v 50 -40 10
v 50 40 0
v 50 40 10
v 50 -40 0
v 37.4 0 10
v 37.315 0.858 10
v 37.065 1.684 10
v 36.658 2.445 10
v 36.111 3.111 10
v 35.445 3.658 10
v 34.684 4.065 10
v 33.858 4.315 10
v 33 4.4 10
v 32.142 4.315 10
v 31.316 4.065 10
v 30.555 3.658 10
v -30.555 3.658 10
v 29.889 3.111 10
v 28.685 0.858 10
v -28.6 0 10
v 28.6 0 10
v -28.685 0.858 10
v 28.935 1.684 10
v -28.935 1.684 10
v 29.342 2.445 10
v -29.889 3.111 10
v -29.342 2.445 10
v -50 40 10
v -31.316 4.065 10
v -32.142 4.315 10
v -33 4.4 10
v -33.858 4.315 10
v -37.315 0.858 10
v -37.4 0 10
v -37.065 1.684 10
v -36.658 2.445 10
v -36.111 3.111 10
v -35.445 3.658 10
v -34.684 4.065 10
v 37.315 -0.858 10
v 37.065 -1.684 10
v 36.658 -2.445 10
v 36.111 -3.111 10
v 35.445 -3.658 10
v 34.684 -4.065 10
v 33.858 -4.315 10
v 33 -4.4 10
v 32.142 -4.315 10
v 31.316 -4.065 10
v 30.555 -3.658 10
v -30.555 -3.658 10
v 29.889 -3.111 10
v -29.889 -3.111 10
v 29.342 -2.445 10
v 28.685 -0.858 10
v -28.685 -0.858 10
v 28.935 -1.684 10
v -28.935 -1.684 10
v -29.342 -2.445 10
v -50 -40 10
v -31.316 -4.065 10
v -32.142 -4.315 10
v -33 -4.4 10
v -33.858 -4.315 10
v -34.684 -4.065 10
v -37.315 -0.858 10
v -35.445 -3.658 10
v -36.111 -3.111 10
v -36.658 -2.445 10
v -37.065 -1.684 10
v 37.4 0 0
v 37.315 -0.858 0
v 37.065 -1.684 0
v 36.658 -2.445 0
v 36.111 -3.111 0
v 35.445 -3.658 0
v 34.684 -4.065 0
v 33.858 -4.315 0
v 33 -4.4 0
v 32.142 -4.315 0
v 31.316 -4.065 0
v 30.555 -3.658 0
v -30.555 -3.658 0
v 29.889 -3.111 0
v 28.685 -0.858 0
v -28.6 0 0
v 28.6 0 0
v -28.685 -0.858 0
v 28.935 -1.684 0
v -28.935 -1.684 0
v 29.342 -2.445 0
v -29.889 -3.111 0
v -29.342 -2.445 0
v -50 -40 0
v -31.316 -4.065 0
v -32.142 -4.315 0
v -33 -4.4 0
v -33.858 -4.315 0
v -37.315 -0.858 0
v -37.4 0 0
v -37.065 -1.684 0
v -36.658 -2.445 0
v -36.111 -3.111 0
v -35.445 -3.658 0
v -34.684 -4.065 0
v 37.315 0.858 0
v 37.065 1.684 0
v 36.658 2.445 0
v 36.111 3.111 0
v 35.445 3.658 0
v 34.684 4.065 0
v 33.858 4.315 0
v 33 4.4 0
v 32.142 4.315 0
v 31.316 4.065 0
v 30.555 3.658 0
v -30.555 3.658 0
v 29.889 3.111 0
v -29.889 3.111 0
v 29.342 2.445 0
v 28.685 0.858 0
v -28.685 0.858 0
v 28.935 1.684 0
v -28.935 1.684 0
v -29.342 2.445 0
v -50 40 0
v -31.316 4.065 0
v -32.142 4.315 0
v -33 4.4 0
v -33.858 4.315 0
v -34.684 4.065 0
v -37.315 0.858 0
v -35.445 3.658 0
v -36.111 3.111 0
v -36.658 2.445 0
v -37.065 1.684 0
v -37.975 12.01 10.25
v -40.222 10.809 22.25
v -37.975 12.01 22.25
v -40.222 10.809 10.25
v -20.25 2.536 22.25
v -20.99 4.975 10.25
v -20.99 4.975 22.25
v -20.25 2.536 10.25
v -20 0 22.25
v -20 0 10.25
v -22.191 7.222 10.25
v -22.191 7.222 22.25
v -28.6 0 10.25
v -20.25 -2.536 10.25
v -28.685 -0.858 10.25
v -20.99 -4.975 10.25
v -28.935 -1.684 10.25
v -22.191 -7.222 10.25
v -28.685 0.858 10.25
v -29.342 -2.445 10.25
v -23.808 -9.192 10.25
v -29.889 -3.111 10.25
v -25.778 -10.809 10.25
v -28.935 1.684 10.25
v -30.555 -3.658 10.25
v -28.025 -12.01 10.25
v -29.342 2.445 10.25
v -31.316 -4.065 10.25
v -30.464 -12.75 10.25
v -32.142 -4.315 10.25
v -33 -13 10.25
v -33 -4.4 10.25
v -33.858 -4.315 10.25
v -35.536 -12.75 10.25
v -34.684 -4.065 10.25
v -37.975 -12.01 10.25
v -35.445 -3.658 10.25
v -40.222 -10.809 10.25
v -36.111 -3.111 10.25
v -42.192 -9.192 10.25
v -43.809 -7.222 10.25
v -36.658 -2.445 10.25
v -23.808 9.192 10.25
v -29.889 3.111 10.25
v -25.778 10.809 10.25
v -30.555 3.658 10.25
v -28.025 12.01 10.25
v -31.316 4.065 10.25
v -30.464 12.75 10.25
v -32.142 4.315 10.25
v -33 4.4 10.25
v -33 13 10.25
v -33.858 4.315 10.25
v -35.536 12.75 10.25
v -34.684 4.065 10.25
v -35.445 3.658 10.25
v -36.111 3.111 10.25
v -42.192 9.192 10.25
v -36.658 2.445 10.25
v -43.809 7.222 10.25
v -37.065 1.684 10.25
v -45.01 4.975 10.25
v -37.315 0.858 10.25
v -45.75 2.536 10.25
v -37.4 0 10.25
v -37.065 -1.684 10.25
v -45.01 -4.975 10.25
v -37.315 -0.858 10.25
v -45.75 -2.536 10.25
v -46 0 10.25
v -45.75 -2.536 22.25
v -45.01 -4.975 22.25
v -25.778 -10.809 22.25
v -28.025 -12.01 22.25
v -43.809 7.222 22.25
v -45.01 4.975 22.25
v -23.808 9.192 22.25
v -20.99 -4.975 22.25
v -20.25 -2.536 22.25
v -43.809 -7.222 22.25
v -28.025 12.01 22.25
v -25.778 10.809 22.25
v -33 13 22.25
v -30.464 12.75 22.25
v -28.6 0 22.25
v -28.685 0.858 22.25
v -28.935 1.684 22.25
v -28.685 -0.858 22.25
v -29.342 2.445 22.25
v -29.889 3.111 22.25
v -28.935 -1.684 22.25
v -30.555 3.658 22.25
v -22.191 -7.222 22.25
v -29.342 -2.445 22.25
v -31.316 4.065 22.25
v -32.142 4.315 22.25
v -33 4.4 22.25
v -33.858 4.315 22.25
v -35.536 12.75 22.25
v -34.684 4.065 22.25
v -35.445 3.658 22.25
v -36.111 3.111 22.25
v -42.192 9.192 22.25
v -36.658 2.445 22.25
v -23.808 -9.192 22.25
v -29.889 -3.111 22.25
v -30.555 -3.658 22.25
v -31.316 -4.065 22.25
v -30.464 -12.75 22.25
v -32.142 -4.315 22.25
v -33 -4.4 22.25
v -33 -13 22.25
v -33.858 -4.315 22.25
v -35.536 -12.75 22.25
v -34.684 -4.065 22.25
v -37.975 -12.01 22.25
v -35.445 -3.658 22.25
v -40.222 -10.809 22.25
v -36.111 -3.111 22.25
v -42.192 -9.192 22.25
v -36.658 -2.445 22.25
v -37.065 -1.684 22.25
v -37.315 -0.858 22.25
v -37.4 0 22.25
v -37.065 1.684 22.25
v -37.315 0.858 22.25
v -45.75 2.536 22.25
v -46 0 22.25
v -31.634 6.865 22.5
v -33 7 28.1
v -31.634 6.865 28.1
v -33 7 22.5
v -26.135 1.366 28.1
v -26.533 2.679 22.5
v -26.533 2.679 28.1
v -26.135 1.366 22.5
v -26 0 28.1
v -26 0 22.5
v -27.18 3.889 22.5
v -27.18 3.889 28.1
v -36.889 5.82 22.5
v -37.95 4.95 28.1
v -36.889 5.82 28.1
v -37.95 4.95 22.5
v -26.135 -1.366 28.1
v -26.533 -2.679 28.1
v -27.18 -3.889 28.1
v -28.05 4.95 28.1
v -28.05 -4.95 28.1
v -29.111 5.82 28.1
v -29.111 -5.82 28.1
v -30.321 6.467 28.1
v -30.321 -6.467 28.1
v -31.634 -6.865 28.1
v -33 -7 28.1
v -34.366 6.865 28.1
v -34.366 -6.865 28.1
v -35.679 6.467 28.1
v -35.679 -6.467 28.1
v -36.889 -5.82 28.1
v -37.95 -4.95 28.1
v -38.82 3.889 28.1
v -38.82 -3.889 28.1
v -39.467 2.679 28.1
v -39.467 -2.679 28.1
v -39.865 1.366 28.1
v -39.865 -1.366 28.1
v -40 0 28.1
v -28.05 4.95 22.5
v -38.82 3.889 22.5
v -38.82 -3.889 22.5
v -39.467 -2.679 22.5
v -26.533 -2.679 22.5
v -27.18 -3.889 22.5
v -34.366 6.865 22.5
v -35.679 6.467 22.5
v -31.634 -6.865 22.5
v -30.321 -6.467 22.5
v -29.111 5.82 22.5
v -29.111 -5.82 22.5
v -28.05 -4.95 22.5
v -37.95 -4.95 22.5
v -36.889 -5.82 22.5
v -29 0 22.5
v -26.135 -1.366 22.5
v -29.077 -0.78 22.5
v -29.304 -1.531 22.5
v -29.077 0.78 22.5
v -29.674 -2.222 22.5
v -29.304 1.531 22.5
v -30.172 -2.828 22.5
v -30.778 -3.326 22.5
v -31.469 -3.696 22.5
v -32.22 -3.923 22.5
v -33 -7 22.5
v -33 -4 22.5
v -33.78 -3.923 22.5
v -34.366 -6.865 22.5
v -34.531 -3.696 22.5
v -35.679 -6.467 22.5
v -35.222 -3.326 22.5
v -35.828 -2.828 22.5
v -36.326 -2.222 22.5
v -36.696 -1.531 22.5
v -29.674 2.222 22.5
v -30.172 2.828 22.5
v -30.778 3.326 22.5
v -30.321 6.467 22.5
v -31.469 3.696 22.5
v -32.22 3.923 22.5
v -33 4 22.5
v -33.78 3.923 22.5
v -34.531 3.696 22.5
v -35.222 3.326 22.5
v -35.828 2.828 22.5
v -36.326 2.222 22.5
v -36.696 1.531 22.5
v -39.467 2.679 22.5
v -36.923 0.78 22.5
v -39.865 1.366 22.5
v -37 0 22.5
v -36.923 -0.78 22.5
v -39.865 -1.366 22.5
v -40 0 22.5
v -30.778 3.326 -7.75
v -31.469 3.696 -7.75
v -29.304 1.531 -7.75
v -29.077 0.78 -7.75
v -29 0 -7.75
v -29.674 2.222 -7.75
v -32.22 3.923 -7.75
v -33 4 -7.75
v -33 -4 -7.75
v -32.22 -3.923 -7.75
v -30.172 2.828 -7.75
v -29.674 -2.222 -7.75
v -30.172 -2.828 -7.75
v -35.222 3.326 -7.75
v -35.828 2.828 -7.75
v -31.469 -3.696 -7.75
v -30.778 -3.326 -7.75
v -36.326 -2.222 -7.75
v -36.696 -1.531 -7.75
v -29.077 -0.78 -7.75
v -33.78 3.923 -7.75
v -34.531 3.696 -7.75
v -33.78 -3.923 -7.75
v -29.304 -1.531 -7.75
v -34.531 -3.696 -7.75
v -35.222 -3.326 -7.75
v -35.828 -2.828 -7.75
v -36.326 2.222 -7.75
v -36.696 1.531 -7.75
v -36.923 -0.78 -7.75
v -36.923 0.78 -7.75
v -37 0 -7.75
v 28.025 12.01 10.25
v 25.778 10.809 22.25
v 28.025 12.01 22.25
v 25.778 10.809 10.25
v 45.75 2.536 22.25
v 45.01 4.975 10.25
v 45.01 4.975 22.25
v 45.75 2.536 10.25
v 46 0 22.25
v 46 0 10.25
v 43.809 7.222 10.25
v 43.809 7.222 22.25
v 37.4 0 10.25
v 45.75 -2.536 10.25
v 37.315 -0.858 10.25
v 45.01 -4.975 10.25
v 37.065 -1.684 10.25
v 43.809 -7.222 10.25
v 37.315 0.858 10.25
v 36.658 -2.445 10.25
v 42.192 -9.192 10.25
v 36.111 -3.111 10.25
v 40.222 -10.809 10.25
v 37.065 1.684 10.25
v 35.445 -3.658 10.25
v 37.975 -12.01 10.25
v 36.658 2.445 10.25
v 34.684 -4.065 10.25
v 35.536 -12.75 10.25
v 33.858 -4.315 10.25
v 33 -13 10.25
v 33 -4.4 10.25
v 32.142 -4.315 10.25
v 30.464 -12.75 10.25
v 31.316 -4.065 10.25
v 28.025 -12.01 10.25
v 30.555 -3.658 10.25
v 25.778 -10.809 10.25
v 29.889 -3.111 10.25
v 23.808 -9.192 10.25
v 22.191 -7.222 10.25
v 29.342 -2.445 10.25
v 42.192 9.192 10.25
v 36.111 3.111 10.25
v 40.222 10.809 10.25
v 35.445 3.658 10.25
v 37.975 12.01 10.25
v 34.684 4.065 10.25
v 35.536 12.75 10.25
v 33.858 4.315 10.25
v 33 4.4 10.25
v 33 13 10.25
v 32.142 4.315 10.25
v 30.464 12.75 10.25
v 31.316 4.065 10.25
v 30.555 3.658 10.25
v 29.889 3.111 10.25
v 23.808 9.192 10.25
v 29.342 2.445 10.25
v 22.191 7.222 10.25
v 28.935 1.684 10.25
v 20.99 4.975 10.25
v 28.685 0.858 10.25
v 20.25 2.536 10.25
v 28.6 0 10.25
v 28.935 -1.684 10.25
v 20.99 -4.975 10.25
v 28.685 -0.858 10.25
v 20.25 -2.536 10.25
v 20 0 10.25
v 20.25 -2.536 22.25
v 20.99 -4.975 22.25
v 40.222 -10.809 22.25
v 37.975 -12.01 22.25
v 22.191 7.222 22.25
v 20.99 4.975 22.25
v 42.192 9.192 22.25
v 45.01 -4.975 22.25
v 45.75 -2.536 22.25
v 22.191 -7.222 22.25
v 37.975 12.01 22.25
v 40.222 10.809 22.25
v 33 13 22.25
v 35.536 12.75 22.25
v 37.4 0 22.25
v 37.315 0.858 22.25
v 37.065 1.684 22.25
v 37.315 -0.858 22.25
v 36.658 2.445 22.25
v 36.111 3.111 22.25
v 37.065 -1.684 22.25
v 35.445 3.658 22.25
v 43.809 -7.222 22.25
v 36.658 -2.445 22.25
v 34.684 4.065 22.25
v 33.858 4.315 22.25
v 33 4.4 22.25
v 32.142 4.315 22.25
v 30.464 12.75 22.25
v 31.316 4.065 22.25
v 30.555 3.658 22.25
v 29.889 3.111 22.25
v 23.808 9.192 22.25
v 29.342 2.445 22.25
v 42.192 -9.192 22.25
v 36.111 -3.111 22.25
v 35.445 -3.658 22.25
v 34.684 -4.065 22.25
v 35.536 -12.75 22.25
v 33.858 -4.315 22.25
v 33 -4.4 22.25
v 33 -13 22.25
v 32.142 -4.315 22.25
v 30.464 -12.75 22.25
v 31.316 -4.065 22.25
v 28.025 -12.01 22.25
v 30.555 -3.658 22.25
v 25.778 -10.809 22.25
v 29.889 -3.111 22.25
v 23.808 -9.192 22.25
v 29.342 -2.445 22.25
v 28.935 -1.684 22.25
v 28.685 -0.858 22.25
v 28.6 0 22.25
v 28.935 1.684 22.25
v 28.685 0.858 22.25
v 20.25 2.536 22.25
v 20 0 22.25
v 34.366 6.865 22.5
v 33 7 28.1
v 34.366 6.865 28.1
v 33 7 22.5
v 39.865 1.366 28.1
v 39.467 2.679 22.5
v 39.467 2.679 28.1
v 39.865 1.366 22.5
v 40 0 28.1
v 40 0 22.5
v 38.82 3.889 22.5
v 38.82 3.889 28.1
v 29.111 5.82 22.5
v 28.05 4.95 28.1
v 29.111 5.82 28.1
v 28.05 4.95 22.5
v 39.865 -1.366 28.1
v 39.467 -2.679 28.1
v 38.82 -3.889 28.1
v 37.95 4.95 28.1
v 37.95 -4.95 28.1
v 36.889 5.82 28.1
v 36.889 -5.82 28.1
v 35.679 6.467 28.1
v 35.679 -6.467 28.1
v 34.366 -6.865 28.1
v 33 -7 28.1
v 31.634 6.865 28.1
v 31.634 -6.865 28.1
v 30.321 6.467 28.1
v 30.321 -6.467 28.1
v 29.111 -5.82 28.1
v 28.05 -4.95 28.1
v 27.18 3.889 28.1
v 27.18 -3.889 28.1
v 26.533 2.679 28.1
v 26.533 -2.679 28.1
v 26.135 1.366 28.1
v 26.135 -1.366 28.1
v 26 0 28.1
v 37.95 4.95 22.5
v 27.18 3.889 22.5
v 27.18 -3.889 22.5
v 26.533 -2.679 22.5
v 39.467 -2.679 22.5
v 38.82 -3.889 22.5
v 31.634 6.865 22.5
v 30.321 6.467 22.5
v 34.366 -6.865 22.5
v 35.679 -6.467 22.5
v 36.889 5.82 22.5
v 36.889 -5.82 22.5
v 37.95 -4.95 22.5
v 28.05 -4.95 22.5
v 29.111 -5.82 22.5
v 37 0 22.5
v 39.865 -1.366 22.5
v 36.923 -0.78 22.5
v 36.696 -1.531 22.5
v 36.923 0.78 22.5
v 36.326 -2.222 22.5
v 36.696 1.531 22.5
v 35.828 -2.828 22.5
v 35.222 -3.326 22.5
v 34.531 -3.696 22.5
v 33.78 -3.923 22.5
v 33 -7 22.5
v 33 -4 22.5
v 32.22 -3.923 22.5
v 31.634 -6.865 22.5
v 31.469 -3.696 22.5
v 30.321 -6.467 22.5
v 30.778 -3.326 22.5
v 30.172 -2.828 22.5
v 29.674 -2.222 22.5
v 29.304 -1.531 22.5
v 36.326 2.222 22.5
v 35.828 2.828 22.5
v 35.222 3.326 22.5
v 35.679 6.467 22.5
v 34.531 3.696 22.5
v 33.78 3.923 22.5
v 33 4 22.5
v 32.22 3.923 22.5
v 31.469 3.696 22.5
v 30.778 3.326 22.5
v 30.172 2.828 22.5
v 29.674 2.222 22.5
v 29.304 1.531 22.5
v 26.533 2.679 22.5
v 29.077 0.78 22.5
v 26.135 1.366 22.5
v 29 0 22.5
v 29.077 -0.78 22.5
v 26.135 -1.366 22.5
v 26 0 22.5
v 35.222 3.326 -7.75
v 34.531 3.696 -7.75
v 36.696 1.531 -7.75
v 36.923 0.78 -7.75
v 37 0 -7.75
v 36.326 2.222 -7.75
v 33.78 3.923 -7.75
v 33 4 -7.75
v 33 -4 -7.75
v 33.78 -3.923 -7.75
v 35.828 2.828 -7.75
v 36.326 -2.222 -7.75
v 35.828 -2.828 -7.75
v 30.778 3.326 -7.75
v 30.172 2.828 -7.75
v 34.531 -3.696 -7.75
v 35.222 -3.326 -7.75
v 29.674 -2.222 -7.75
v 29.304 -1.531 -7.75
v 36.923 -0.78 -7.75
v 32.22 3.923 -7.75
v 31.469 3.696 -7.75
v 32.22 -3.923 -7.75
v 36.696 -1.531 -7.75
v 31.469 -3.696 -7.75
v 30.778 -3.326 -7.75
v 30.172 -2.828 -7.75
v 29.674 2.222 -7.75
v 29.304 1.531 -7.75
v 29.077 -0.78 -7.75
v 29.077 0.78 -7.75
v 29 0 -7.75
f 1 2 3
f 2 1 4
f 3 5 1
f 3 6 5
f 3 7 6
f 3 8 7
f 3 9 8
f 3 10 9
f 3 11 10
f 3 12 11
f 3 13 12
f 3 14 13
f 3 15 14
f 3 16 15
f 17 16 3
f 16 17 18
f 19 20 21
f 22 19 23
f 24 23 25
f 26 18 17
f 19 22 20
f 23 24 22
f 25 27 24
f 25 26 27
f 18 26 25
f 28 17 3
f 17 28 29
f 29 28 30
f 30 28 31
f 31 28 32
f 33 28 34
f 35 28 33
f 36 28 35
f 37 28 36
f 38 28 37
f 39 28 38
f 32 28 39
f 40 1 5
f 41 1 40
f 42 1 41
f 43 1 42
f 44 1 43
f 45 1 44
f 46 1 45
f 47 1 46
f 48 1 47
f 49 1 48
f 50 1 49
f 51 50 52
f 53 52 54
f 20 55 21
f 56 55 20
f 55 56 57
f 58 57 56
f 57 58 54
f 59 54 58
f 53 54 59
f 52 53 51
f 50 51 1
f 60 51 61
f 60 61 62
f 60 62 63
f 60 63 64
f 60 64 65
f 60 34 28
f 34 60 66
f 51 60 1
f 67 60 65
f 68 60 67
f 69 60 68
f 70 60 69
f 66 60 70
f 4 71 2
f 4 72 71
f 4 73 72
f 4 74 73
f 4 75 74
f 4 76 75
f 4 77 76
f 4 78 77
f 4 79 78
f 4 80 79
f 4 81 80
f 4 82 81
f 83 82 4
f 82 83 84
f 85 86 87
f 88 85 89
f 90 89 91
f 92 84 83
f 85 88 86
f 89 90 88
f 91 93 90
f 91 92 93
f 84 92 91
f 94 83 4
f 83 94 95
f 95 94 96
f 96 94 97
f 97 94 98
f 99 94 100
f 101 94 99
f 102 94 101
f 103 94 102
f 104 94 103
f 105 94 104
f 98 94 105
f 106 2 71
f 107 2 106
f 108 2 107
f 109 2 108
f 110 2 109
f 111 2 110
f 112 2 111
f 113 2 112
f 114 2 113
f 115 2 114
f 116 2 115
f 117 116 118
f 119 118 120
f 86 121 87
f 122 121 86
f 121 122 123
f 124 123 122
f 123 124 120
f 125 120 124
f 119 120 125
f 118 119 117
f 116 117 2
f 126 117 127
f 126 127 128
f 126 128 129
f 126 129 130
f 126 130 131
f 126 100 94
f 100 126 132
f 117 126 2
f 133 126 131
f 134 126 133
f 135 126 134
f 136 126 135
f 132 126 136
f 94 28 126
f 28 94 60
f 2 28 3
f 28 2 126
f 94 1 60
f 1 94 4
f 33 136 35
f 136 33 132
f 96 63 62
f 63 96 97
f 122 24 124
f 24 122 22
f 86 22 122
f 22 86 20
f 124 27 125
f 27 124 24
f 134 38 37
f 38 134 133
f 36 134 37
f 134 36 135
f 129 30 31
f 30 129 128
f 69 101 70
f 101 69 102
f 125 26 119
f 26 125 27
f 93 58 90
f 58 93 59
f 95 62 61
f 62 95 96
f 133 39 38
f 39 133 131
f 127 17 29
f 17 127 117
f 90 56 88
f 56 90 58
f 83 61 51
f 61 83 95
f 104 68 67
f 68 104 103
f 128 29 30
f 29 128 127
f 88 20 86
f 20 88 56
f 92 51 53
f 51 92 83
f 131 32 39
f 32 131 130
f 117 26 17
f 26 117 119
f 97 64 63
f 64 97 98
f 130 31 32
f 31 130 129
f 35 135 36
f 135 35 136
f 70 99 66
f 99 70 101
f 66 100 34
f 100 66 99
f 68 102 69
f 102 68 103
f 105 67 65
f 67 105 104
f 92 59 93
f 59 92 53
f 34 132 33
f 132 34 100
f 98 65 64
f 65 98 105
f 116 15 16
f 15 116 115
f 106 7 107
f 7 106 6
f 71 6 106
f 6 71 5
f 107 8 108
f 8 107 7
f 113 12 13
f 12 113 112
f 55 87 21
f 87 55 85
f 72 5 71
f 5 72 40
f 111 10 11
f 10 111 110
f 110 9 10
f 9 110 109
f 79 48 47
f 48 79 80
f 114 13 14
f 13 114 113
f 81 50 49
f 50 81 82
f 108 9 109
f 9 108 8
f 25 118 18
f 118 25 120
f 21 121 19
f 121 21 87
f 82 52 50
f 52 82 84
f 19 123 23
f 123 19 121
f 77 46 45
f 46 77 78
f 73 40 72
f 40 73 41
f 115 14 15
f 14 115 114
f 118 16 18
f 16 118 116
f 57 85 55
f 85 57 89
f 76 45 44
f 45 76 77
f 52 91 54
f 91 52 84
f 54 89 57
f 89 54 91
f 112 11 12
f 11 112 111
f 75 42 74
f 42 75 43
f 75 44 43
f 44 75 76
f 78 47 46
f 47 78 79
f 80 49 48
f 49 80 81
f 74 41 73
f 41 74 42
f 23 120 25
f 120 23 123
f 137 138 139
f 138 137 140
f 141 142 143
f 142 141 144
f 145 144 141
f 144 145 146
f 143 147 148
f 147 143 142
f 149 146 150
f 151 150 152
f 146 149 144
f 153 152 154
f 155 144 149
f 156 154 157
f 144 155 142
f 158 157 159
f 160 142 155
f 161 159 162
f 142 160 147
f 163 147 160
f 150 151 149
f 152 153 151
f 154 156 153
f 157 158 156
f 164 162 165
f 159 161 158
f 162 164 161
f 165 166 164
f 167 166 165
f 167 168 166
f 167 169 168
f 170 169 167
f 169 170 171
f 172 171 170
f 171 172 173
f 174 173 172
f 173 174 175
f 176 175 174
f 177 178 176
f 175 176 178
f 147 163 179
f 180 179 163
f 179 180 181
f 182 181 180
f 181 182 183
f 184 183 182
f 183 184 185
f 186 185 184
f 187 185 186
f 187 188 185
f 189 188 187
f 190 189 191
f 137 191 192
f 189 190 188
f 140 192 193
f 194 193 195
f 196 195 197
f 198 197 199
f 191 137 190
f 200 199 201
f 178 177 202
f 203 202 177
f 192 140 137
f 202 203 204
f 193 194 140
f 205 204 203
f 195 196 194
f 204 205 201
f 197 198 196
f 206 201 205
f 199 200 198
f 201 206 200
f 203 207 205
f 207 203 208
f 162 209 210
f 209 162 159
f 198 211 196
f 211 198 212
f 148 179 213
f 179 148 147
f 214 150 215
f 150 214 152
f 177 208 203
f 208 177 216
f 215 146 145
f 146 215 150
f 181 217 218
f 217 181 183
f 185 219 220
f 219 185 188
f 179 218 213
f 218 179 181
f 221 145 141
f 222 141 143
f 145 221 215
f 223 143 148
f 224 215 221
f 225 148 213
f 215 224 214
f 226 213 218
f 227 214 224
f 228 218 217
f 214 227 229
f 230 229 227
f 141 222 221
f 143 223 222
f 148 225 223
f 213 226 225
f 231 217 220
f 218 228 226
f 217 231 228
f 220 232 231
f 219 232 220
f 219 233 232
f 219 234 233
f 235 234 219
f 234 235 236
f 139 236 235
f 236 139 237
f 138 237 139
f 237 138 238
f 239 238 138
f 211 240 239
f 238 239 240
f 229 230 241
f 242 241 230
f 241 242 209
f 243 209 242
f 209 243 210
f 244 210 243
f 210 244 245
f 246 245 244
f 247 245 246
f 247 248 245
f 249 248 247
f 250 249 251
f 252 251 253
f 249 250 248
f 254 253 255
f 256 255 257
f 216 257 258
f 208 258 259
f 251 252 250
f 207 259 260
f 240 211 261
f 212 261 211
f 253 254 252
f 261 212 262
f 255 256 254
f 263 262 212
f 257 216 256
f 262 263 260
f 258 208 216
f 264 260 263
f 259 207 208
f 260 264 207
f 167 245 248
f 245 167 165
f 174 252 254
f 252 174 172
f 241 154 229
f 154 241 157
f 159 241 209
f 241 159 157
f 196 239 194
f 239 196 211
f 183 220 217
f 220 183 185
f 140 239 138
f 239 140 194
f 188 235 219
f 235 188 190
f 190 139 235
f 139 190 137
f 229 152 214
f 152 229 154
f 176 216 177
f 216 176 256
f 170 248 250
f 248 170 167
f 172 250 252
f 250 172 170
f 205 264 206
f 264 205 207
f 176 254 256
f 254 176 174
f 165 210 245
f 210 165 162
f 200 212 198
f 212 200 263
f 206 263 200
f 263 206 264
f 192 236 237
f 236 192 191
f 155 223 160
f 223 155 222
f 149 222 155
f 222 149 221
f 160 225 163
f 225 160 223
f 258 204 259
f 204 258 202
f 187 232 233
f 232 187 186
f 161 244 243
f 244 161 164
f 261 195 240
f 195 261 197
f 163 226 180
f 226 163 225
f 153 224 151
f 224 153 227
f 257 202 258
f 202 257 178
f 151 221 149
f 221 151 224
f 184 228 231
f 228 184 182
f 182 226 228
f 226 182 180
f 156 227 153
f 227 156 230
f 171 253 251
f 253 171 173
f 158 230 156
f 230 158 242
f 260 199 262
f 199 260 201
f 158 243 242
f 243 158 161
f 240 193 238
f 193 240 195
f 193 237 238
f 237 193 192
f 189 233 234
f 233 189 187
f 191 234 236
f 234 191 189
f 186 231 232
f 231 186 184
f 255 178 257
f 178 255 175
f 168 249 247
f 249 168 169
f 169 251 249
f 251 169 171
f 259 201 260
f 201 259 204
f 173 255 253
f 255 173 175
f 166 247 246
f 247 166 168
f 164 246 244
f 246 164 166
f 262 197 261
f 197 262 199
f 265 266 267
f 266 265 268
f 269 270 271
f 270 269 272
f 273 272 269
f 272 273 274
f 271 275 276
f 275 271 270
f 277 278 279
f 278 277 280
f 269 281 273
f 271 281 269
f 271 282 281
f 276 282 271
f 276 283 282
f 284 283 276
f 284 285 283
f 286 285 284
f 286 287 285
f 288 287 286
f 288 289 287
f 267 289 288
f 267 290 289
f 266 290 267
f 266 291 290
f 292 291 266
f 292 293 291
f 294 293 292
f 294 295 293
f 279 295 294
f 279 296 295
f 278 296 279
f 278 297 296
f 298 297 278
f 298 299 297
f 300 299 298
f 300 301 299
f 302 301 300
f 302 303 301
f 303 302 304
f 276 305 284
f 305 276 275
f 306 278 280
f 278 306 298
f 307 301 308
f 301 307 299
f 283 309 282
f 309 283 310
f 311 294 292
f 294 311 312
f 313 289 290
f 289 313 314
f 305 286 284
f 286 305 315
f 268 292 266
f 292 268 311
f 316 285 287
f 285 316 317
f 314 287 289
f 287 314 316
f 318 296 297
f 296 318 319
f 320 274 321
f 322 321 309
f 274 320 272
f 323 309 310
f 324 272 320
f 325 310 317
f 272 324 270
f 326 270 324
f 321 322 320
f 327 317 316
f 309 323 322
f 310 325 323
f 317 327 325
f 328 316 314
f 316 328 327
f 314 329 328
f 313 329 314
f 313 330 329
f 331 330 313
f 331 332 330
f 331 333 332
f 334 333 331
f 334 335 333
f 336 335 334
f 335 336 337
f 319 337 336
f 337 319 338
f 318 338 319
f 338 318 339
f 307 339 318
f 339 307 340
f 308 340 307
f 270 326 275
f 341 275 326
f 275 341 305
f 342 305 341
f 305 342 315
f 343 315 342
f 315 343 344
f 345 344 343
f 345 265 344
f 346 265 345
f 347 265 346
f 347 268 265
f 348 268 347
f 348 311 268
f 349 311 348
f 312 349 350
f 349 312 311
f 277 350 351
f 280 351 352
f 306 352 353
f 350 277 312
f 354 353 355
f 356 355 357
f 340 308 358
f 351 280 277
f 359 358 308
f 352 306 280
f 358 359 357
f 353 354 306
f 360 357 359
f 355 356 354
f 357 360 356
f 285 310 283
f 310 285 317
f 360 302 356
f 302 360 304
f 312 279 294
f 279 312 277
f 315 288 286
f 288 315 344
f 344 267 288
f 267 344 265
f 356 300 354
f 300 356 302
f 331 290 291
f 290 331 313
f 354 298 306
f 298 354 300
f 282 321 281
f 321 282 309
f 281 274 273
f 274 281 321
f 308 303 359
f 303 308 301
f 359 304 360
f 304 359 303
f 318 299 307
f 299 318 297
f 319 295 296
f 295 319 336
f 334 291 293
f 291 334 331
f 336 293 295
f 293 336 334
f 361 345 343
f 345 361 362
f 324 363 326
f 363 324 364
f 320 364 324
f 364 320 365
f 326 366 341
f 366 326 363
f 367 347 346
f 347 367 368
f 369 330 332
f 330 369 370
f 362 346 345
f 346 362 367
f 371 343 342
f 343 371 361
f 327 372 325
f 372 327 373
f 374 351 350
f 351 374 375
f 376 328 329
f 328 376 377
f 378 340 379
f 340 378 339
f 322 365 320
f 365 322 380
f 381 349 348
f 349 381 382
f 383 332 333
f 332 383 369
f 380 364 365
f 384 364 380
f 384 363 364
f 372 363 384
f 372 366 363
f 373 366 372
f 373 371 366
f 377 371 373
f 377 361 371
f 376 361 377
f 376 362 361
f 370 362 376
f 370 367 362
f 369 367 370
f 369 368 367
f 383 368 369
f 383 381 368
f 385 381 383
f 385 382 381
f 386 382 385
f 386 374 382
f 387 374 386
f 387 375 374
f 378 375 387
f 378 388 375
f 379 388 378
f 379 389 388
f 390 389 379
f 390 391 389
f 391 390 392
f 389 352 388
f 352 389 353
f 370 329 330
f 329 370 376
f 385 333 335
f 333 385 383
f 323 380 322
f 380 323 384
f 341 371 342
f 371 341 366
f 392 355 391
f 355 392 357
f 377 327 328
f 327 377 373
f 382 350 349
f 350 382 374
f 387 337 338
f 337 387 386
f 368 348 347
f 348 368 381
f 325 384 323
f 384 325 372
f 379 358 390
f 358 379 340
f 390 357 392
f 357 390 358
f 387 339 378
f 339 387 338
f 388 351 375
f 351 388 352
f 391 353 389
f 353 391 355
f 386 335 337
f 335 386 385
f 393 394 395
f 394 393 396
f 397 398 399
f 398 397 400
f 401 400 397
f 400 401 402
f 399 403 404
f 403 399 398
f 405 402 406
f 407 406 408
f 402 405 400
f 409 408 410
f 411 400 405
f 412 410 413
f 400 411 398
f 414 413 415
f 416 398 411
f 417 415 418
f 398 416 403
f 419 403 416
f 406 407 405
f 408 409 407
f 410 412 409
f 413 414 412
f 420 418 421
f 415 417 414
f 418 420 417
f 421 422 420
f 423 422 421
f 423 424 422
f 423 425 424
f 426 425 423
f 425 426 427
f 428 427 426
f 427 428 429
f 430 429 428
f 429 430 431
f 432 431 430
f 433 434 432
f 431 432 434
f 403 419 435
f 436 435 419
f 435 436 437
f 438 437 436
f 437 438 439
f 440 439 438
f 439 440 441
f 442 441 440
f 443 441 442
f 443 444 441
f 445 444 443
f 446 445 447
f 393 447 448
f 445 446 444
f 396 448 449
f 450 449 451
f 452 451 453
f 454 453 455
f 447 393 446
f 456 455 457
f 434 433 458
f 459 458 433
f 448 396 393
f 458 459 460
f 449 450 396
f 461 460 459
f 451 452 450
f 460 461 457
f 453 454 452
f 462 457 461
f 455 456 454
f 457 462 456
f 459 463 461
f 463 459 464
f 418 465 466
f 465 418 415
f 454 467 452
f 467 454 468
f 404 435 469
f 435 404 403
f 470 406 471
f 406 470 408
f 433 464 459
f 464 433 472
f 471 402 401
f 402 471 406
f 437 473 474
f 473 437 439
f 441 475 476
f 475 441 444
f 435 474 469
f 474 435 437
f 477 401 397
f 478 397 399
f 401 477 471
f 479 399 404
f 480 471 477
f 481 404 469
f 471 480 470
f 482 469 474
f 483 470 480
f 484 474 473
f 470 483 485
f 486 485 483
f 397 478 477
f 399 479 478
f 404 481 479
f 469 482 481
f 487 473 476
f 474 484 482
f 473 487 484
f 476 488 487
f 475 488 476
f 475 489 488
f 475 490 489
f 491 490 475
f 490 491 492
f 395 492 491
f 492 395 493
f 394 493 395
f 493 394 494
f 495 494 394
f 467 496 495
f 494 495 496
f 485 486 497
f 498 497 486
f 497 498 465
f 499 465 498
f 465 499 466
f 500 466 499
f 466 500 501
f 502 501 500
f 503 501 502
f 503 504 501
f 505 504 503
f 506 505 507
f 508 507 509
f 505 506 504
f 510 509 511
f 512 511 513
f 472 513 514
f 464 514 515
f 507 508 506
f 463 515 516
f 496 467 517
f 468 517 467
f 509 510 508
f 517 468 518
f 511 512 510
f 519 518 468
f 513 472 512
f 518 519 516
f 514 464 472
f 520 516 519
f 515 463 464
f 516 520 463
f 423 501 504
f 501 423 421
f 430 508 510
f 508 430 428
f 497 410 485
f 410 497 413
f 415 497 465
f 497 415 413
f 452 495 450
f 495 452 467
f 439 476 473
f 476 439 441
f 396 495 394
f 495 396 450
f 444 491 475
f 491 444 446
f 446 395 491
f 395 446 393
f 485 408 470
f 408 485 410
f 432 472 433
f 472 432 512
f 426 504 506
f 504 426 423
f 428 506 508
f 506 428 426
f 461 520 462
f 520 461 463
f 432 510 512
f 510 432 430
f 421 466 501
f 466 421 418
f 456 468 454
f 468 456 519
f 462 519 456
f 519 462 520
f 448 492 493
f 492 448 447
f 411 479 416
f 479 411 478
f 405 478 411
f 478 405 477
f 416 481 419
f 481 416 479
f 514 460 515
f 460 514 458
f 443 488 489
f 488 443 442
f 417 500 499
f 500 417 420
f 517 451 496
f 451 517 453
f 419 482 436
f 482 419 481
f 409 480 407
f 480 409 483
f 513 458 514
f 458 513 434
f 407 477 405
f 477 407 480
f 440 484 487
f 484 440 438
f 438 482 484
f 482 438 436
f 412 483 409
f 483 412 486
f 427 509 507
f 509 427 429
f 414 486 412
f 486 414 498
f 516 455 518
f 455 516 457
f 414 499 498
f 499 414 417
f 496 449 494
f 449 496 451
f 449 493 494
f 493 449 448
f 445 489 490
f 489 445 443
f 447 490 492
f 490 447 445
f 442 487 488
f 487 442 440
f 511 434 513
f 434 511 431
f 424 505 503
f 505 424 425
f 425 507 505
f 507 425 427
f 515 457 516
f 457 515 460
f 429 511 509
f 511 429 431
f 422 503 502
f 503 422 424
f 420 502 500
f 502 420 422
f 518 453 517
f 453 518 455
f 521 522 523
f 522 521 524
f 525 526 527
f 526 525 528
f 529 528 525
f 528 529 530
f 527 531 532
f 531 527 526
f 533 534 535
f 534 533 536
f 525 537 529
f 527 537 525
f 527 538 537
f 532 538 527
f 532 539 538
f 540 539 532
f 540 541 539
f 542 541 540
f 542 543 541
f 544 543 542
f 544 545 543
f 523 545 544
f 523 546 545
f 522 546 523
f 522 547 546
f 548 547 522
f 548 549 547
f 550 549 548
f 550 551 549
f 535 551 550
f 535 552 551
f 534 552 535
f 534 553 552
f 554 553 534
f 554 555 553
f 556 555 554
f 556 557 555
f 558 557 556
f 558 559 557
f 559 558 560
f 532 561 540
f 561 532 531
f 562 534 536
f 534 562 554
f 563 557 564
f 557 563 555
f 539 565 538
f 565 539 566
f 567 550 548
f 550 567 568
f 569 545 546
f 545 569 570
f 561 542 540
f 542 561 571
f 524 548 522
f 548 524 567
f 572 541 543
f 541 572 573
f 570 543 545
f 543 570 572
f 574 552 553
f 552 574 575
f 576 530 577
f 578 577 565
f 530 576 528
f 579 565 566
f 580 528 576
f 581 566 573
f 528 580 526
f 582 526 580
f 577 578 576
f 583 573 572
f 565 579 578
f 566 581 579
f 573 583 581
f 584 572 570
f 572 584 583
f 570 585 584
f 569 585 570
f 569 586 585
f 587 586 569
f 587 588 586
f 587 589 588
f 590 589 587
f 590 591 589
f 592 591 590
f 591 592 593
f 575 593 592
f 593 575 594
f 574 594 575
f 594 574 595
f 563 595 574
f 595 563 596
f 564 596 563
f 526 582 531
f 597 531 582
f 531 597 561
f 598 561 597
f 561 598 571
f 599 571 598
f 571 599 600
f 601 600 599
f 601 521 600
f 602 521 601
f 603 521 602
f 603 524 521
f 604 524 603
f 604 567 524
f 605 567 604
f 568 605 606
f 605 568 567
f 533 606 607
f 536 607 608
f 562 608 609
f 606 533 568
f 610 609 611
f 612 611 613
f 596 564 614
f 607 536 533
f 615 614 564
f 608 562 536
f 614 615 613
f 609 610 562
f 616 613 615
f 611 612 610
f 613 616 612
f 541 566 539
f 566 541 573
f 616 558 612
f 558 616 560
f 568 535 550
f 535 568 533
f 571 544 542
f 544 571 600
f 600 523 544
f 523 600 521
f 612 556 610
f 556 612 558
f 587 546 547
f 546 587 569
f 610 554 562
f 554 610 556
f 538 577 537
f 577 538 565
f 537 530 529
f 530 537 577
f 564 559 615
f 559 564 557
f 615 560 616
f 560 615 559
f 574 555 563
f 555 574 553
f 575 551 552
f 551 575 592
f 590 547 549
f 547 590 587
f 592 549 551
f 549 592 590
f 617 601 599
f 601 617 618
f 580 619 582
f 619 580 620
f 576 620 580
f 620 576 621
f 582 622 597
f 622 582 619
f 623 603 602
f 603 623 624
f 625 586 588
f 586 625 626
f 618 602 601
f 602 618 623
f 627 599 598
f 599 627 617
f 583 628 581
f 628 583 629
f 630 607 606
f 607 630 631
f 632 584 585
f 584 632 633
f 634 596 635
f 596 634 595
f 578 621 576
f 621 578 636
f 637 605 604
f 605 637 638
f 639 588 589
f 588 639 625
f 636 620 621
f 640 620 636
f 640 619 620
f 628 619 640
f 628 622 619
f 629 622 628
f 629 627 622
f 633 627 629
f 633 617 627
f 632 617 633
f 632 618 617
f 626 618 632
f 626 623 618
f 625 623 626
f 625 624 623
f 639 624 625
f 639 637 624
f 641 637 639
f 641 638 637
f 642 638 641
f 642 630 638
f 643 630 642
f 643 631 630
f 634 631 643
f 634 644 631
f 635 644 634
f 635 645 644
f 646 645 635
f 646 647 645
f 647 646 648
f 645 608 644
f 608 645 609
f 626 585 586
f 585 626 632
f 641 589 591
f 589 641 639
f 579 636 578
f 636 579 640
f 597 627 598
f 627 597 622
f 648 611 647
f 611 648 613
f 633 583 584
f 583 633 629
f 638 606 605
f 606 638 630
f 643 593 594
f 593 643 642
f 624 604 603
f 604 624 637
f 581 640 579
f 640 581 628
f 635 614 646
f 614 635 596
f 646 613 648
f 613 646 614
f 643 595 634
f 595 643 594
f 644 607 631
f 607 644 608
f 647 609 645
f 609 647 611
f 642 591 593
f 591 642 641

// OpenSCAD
$fn = 32;

// ------------------------------------------------------------------------
// Standoff columns: 2 d26 standoffs, bolts d8
// Every part is its own module, assembly() places them once.
// ------------------------------------------------------------------------

// --- part 1 ---
module base_plate() {
  difference() {
    translate([-50, -40, 0]) cube([100, 80, 10]);
    translate([-33, 0, -1]) cylinder(h = 12, d = 8.8);
    translate([33, 0, -1]) cylinder(h = 12, d = 8.8);
  }
}

// --- part 2 ---
module spacer1() {
  difference() {
      translate([0, 0, 0]) cylinder(h = 12, d = 26);
      translate([0, 0, -1]) cylinder(h = 14, d = 8.8);
    }
}

// --- part 3 ---
module bolt1() {
  cylinder(h = 5.6, d = 14);
  translate([0, 0, -30.25]) cylinder(h = 30.25, d = 8);
}

// --- part 4 ---
module spacer2() {
  difference() {
      translate([0, 0, 0]) cylinder(h = 12, d = 26);
      translate([0, 0, -1]) cylinder(h = 14, d = 8.8);
    }
}

// --- part 5 ---
module bolt2() {
  cylinder(h = 5.6, d = 14);
  translate([0, 0, -30.25]) cylinder(h = 30.25, d = 8);
}

// --- assembly ---
module assembly() {
  translate([0, 0, 0]) rotate([0, 0, 0]) base_plate();
  translate([-33, 0, 10.25]) rotate([0, 0, 0]) spacer1();
  translate([-33, 0, 22.5]) rotate([0, 0, 0]) bolt1();
  translate([33, 0, 10.25]) rotate([0, 0, 0]) spacer2();
  translate([33, 0, 22.5]) rotate([0, 0, 0]) bolt2();
}

assembly();
